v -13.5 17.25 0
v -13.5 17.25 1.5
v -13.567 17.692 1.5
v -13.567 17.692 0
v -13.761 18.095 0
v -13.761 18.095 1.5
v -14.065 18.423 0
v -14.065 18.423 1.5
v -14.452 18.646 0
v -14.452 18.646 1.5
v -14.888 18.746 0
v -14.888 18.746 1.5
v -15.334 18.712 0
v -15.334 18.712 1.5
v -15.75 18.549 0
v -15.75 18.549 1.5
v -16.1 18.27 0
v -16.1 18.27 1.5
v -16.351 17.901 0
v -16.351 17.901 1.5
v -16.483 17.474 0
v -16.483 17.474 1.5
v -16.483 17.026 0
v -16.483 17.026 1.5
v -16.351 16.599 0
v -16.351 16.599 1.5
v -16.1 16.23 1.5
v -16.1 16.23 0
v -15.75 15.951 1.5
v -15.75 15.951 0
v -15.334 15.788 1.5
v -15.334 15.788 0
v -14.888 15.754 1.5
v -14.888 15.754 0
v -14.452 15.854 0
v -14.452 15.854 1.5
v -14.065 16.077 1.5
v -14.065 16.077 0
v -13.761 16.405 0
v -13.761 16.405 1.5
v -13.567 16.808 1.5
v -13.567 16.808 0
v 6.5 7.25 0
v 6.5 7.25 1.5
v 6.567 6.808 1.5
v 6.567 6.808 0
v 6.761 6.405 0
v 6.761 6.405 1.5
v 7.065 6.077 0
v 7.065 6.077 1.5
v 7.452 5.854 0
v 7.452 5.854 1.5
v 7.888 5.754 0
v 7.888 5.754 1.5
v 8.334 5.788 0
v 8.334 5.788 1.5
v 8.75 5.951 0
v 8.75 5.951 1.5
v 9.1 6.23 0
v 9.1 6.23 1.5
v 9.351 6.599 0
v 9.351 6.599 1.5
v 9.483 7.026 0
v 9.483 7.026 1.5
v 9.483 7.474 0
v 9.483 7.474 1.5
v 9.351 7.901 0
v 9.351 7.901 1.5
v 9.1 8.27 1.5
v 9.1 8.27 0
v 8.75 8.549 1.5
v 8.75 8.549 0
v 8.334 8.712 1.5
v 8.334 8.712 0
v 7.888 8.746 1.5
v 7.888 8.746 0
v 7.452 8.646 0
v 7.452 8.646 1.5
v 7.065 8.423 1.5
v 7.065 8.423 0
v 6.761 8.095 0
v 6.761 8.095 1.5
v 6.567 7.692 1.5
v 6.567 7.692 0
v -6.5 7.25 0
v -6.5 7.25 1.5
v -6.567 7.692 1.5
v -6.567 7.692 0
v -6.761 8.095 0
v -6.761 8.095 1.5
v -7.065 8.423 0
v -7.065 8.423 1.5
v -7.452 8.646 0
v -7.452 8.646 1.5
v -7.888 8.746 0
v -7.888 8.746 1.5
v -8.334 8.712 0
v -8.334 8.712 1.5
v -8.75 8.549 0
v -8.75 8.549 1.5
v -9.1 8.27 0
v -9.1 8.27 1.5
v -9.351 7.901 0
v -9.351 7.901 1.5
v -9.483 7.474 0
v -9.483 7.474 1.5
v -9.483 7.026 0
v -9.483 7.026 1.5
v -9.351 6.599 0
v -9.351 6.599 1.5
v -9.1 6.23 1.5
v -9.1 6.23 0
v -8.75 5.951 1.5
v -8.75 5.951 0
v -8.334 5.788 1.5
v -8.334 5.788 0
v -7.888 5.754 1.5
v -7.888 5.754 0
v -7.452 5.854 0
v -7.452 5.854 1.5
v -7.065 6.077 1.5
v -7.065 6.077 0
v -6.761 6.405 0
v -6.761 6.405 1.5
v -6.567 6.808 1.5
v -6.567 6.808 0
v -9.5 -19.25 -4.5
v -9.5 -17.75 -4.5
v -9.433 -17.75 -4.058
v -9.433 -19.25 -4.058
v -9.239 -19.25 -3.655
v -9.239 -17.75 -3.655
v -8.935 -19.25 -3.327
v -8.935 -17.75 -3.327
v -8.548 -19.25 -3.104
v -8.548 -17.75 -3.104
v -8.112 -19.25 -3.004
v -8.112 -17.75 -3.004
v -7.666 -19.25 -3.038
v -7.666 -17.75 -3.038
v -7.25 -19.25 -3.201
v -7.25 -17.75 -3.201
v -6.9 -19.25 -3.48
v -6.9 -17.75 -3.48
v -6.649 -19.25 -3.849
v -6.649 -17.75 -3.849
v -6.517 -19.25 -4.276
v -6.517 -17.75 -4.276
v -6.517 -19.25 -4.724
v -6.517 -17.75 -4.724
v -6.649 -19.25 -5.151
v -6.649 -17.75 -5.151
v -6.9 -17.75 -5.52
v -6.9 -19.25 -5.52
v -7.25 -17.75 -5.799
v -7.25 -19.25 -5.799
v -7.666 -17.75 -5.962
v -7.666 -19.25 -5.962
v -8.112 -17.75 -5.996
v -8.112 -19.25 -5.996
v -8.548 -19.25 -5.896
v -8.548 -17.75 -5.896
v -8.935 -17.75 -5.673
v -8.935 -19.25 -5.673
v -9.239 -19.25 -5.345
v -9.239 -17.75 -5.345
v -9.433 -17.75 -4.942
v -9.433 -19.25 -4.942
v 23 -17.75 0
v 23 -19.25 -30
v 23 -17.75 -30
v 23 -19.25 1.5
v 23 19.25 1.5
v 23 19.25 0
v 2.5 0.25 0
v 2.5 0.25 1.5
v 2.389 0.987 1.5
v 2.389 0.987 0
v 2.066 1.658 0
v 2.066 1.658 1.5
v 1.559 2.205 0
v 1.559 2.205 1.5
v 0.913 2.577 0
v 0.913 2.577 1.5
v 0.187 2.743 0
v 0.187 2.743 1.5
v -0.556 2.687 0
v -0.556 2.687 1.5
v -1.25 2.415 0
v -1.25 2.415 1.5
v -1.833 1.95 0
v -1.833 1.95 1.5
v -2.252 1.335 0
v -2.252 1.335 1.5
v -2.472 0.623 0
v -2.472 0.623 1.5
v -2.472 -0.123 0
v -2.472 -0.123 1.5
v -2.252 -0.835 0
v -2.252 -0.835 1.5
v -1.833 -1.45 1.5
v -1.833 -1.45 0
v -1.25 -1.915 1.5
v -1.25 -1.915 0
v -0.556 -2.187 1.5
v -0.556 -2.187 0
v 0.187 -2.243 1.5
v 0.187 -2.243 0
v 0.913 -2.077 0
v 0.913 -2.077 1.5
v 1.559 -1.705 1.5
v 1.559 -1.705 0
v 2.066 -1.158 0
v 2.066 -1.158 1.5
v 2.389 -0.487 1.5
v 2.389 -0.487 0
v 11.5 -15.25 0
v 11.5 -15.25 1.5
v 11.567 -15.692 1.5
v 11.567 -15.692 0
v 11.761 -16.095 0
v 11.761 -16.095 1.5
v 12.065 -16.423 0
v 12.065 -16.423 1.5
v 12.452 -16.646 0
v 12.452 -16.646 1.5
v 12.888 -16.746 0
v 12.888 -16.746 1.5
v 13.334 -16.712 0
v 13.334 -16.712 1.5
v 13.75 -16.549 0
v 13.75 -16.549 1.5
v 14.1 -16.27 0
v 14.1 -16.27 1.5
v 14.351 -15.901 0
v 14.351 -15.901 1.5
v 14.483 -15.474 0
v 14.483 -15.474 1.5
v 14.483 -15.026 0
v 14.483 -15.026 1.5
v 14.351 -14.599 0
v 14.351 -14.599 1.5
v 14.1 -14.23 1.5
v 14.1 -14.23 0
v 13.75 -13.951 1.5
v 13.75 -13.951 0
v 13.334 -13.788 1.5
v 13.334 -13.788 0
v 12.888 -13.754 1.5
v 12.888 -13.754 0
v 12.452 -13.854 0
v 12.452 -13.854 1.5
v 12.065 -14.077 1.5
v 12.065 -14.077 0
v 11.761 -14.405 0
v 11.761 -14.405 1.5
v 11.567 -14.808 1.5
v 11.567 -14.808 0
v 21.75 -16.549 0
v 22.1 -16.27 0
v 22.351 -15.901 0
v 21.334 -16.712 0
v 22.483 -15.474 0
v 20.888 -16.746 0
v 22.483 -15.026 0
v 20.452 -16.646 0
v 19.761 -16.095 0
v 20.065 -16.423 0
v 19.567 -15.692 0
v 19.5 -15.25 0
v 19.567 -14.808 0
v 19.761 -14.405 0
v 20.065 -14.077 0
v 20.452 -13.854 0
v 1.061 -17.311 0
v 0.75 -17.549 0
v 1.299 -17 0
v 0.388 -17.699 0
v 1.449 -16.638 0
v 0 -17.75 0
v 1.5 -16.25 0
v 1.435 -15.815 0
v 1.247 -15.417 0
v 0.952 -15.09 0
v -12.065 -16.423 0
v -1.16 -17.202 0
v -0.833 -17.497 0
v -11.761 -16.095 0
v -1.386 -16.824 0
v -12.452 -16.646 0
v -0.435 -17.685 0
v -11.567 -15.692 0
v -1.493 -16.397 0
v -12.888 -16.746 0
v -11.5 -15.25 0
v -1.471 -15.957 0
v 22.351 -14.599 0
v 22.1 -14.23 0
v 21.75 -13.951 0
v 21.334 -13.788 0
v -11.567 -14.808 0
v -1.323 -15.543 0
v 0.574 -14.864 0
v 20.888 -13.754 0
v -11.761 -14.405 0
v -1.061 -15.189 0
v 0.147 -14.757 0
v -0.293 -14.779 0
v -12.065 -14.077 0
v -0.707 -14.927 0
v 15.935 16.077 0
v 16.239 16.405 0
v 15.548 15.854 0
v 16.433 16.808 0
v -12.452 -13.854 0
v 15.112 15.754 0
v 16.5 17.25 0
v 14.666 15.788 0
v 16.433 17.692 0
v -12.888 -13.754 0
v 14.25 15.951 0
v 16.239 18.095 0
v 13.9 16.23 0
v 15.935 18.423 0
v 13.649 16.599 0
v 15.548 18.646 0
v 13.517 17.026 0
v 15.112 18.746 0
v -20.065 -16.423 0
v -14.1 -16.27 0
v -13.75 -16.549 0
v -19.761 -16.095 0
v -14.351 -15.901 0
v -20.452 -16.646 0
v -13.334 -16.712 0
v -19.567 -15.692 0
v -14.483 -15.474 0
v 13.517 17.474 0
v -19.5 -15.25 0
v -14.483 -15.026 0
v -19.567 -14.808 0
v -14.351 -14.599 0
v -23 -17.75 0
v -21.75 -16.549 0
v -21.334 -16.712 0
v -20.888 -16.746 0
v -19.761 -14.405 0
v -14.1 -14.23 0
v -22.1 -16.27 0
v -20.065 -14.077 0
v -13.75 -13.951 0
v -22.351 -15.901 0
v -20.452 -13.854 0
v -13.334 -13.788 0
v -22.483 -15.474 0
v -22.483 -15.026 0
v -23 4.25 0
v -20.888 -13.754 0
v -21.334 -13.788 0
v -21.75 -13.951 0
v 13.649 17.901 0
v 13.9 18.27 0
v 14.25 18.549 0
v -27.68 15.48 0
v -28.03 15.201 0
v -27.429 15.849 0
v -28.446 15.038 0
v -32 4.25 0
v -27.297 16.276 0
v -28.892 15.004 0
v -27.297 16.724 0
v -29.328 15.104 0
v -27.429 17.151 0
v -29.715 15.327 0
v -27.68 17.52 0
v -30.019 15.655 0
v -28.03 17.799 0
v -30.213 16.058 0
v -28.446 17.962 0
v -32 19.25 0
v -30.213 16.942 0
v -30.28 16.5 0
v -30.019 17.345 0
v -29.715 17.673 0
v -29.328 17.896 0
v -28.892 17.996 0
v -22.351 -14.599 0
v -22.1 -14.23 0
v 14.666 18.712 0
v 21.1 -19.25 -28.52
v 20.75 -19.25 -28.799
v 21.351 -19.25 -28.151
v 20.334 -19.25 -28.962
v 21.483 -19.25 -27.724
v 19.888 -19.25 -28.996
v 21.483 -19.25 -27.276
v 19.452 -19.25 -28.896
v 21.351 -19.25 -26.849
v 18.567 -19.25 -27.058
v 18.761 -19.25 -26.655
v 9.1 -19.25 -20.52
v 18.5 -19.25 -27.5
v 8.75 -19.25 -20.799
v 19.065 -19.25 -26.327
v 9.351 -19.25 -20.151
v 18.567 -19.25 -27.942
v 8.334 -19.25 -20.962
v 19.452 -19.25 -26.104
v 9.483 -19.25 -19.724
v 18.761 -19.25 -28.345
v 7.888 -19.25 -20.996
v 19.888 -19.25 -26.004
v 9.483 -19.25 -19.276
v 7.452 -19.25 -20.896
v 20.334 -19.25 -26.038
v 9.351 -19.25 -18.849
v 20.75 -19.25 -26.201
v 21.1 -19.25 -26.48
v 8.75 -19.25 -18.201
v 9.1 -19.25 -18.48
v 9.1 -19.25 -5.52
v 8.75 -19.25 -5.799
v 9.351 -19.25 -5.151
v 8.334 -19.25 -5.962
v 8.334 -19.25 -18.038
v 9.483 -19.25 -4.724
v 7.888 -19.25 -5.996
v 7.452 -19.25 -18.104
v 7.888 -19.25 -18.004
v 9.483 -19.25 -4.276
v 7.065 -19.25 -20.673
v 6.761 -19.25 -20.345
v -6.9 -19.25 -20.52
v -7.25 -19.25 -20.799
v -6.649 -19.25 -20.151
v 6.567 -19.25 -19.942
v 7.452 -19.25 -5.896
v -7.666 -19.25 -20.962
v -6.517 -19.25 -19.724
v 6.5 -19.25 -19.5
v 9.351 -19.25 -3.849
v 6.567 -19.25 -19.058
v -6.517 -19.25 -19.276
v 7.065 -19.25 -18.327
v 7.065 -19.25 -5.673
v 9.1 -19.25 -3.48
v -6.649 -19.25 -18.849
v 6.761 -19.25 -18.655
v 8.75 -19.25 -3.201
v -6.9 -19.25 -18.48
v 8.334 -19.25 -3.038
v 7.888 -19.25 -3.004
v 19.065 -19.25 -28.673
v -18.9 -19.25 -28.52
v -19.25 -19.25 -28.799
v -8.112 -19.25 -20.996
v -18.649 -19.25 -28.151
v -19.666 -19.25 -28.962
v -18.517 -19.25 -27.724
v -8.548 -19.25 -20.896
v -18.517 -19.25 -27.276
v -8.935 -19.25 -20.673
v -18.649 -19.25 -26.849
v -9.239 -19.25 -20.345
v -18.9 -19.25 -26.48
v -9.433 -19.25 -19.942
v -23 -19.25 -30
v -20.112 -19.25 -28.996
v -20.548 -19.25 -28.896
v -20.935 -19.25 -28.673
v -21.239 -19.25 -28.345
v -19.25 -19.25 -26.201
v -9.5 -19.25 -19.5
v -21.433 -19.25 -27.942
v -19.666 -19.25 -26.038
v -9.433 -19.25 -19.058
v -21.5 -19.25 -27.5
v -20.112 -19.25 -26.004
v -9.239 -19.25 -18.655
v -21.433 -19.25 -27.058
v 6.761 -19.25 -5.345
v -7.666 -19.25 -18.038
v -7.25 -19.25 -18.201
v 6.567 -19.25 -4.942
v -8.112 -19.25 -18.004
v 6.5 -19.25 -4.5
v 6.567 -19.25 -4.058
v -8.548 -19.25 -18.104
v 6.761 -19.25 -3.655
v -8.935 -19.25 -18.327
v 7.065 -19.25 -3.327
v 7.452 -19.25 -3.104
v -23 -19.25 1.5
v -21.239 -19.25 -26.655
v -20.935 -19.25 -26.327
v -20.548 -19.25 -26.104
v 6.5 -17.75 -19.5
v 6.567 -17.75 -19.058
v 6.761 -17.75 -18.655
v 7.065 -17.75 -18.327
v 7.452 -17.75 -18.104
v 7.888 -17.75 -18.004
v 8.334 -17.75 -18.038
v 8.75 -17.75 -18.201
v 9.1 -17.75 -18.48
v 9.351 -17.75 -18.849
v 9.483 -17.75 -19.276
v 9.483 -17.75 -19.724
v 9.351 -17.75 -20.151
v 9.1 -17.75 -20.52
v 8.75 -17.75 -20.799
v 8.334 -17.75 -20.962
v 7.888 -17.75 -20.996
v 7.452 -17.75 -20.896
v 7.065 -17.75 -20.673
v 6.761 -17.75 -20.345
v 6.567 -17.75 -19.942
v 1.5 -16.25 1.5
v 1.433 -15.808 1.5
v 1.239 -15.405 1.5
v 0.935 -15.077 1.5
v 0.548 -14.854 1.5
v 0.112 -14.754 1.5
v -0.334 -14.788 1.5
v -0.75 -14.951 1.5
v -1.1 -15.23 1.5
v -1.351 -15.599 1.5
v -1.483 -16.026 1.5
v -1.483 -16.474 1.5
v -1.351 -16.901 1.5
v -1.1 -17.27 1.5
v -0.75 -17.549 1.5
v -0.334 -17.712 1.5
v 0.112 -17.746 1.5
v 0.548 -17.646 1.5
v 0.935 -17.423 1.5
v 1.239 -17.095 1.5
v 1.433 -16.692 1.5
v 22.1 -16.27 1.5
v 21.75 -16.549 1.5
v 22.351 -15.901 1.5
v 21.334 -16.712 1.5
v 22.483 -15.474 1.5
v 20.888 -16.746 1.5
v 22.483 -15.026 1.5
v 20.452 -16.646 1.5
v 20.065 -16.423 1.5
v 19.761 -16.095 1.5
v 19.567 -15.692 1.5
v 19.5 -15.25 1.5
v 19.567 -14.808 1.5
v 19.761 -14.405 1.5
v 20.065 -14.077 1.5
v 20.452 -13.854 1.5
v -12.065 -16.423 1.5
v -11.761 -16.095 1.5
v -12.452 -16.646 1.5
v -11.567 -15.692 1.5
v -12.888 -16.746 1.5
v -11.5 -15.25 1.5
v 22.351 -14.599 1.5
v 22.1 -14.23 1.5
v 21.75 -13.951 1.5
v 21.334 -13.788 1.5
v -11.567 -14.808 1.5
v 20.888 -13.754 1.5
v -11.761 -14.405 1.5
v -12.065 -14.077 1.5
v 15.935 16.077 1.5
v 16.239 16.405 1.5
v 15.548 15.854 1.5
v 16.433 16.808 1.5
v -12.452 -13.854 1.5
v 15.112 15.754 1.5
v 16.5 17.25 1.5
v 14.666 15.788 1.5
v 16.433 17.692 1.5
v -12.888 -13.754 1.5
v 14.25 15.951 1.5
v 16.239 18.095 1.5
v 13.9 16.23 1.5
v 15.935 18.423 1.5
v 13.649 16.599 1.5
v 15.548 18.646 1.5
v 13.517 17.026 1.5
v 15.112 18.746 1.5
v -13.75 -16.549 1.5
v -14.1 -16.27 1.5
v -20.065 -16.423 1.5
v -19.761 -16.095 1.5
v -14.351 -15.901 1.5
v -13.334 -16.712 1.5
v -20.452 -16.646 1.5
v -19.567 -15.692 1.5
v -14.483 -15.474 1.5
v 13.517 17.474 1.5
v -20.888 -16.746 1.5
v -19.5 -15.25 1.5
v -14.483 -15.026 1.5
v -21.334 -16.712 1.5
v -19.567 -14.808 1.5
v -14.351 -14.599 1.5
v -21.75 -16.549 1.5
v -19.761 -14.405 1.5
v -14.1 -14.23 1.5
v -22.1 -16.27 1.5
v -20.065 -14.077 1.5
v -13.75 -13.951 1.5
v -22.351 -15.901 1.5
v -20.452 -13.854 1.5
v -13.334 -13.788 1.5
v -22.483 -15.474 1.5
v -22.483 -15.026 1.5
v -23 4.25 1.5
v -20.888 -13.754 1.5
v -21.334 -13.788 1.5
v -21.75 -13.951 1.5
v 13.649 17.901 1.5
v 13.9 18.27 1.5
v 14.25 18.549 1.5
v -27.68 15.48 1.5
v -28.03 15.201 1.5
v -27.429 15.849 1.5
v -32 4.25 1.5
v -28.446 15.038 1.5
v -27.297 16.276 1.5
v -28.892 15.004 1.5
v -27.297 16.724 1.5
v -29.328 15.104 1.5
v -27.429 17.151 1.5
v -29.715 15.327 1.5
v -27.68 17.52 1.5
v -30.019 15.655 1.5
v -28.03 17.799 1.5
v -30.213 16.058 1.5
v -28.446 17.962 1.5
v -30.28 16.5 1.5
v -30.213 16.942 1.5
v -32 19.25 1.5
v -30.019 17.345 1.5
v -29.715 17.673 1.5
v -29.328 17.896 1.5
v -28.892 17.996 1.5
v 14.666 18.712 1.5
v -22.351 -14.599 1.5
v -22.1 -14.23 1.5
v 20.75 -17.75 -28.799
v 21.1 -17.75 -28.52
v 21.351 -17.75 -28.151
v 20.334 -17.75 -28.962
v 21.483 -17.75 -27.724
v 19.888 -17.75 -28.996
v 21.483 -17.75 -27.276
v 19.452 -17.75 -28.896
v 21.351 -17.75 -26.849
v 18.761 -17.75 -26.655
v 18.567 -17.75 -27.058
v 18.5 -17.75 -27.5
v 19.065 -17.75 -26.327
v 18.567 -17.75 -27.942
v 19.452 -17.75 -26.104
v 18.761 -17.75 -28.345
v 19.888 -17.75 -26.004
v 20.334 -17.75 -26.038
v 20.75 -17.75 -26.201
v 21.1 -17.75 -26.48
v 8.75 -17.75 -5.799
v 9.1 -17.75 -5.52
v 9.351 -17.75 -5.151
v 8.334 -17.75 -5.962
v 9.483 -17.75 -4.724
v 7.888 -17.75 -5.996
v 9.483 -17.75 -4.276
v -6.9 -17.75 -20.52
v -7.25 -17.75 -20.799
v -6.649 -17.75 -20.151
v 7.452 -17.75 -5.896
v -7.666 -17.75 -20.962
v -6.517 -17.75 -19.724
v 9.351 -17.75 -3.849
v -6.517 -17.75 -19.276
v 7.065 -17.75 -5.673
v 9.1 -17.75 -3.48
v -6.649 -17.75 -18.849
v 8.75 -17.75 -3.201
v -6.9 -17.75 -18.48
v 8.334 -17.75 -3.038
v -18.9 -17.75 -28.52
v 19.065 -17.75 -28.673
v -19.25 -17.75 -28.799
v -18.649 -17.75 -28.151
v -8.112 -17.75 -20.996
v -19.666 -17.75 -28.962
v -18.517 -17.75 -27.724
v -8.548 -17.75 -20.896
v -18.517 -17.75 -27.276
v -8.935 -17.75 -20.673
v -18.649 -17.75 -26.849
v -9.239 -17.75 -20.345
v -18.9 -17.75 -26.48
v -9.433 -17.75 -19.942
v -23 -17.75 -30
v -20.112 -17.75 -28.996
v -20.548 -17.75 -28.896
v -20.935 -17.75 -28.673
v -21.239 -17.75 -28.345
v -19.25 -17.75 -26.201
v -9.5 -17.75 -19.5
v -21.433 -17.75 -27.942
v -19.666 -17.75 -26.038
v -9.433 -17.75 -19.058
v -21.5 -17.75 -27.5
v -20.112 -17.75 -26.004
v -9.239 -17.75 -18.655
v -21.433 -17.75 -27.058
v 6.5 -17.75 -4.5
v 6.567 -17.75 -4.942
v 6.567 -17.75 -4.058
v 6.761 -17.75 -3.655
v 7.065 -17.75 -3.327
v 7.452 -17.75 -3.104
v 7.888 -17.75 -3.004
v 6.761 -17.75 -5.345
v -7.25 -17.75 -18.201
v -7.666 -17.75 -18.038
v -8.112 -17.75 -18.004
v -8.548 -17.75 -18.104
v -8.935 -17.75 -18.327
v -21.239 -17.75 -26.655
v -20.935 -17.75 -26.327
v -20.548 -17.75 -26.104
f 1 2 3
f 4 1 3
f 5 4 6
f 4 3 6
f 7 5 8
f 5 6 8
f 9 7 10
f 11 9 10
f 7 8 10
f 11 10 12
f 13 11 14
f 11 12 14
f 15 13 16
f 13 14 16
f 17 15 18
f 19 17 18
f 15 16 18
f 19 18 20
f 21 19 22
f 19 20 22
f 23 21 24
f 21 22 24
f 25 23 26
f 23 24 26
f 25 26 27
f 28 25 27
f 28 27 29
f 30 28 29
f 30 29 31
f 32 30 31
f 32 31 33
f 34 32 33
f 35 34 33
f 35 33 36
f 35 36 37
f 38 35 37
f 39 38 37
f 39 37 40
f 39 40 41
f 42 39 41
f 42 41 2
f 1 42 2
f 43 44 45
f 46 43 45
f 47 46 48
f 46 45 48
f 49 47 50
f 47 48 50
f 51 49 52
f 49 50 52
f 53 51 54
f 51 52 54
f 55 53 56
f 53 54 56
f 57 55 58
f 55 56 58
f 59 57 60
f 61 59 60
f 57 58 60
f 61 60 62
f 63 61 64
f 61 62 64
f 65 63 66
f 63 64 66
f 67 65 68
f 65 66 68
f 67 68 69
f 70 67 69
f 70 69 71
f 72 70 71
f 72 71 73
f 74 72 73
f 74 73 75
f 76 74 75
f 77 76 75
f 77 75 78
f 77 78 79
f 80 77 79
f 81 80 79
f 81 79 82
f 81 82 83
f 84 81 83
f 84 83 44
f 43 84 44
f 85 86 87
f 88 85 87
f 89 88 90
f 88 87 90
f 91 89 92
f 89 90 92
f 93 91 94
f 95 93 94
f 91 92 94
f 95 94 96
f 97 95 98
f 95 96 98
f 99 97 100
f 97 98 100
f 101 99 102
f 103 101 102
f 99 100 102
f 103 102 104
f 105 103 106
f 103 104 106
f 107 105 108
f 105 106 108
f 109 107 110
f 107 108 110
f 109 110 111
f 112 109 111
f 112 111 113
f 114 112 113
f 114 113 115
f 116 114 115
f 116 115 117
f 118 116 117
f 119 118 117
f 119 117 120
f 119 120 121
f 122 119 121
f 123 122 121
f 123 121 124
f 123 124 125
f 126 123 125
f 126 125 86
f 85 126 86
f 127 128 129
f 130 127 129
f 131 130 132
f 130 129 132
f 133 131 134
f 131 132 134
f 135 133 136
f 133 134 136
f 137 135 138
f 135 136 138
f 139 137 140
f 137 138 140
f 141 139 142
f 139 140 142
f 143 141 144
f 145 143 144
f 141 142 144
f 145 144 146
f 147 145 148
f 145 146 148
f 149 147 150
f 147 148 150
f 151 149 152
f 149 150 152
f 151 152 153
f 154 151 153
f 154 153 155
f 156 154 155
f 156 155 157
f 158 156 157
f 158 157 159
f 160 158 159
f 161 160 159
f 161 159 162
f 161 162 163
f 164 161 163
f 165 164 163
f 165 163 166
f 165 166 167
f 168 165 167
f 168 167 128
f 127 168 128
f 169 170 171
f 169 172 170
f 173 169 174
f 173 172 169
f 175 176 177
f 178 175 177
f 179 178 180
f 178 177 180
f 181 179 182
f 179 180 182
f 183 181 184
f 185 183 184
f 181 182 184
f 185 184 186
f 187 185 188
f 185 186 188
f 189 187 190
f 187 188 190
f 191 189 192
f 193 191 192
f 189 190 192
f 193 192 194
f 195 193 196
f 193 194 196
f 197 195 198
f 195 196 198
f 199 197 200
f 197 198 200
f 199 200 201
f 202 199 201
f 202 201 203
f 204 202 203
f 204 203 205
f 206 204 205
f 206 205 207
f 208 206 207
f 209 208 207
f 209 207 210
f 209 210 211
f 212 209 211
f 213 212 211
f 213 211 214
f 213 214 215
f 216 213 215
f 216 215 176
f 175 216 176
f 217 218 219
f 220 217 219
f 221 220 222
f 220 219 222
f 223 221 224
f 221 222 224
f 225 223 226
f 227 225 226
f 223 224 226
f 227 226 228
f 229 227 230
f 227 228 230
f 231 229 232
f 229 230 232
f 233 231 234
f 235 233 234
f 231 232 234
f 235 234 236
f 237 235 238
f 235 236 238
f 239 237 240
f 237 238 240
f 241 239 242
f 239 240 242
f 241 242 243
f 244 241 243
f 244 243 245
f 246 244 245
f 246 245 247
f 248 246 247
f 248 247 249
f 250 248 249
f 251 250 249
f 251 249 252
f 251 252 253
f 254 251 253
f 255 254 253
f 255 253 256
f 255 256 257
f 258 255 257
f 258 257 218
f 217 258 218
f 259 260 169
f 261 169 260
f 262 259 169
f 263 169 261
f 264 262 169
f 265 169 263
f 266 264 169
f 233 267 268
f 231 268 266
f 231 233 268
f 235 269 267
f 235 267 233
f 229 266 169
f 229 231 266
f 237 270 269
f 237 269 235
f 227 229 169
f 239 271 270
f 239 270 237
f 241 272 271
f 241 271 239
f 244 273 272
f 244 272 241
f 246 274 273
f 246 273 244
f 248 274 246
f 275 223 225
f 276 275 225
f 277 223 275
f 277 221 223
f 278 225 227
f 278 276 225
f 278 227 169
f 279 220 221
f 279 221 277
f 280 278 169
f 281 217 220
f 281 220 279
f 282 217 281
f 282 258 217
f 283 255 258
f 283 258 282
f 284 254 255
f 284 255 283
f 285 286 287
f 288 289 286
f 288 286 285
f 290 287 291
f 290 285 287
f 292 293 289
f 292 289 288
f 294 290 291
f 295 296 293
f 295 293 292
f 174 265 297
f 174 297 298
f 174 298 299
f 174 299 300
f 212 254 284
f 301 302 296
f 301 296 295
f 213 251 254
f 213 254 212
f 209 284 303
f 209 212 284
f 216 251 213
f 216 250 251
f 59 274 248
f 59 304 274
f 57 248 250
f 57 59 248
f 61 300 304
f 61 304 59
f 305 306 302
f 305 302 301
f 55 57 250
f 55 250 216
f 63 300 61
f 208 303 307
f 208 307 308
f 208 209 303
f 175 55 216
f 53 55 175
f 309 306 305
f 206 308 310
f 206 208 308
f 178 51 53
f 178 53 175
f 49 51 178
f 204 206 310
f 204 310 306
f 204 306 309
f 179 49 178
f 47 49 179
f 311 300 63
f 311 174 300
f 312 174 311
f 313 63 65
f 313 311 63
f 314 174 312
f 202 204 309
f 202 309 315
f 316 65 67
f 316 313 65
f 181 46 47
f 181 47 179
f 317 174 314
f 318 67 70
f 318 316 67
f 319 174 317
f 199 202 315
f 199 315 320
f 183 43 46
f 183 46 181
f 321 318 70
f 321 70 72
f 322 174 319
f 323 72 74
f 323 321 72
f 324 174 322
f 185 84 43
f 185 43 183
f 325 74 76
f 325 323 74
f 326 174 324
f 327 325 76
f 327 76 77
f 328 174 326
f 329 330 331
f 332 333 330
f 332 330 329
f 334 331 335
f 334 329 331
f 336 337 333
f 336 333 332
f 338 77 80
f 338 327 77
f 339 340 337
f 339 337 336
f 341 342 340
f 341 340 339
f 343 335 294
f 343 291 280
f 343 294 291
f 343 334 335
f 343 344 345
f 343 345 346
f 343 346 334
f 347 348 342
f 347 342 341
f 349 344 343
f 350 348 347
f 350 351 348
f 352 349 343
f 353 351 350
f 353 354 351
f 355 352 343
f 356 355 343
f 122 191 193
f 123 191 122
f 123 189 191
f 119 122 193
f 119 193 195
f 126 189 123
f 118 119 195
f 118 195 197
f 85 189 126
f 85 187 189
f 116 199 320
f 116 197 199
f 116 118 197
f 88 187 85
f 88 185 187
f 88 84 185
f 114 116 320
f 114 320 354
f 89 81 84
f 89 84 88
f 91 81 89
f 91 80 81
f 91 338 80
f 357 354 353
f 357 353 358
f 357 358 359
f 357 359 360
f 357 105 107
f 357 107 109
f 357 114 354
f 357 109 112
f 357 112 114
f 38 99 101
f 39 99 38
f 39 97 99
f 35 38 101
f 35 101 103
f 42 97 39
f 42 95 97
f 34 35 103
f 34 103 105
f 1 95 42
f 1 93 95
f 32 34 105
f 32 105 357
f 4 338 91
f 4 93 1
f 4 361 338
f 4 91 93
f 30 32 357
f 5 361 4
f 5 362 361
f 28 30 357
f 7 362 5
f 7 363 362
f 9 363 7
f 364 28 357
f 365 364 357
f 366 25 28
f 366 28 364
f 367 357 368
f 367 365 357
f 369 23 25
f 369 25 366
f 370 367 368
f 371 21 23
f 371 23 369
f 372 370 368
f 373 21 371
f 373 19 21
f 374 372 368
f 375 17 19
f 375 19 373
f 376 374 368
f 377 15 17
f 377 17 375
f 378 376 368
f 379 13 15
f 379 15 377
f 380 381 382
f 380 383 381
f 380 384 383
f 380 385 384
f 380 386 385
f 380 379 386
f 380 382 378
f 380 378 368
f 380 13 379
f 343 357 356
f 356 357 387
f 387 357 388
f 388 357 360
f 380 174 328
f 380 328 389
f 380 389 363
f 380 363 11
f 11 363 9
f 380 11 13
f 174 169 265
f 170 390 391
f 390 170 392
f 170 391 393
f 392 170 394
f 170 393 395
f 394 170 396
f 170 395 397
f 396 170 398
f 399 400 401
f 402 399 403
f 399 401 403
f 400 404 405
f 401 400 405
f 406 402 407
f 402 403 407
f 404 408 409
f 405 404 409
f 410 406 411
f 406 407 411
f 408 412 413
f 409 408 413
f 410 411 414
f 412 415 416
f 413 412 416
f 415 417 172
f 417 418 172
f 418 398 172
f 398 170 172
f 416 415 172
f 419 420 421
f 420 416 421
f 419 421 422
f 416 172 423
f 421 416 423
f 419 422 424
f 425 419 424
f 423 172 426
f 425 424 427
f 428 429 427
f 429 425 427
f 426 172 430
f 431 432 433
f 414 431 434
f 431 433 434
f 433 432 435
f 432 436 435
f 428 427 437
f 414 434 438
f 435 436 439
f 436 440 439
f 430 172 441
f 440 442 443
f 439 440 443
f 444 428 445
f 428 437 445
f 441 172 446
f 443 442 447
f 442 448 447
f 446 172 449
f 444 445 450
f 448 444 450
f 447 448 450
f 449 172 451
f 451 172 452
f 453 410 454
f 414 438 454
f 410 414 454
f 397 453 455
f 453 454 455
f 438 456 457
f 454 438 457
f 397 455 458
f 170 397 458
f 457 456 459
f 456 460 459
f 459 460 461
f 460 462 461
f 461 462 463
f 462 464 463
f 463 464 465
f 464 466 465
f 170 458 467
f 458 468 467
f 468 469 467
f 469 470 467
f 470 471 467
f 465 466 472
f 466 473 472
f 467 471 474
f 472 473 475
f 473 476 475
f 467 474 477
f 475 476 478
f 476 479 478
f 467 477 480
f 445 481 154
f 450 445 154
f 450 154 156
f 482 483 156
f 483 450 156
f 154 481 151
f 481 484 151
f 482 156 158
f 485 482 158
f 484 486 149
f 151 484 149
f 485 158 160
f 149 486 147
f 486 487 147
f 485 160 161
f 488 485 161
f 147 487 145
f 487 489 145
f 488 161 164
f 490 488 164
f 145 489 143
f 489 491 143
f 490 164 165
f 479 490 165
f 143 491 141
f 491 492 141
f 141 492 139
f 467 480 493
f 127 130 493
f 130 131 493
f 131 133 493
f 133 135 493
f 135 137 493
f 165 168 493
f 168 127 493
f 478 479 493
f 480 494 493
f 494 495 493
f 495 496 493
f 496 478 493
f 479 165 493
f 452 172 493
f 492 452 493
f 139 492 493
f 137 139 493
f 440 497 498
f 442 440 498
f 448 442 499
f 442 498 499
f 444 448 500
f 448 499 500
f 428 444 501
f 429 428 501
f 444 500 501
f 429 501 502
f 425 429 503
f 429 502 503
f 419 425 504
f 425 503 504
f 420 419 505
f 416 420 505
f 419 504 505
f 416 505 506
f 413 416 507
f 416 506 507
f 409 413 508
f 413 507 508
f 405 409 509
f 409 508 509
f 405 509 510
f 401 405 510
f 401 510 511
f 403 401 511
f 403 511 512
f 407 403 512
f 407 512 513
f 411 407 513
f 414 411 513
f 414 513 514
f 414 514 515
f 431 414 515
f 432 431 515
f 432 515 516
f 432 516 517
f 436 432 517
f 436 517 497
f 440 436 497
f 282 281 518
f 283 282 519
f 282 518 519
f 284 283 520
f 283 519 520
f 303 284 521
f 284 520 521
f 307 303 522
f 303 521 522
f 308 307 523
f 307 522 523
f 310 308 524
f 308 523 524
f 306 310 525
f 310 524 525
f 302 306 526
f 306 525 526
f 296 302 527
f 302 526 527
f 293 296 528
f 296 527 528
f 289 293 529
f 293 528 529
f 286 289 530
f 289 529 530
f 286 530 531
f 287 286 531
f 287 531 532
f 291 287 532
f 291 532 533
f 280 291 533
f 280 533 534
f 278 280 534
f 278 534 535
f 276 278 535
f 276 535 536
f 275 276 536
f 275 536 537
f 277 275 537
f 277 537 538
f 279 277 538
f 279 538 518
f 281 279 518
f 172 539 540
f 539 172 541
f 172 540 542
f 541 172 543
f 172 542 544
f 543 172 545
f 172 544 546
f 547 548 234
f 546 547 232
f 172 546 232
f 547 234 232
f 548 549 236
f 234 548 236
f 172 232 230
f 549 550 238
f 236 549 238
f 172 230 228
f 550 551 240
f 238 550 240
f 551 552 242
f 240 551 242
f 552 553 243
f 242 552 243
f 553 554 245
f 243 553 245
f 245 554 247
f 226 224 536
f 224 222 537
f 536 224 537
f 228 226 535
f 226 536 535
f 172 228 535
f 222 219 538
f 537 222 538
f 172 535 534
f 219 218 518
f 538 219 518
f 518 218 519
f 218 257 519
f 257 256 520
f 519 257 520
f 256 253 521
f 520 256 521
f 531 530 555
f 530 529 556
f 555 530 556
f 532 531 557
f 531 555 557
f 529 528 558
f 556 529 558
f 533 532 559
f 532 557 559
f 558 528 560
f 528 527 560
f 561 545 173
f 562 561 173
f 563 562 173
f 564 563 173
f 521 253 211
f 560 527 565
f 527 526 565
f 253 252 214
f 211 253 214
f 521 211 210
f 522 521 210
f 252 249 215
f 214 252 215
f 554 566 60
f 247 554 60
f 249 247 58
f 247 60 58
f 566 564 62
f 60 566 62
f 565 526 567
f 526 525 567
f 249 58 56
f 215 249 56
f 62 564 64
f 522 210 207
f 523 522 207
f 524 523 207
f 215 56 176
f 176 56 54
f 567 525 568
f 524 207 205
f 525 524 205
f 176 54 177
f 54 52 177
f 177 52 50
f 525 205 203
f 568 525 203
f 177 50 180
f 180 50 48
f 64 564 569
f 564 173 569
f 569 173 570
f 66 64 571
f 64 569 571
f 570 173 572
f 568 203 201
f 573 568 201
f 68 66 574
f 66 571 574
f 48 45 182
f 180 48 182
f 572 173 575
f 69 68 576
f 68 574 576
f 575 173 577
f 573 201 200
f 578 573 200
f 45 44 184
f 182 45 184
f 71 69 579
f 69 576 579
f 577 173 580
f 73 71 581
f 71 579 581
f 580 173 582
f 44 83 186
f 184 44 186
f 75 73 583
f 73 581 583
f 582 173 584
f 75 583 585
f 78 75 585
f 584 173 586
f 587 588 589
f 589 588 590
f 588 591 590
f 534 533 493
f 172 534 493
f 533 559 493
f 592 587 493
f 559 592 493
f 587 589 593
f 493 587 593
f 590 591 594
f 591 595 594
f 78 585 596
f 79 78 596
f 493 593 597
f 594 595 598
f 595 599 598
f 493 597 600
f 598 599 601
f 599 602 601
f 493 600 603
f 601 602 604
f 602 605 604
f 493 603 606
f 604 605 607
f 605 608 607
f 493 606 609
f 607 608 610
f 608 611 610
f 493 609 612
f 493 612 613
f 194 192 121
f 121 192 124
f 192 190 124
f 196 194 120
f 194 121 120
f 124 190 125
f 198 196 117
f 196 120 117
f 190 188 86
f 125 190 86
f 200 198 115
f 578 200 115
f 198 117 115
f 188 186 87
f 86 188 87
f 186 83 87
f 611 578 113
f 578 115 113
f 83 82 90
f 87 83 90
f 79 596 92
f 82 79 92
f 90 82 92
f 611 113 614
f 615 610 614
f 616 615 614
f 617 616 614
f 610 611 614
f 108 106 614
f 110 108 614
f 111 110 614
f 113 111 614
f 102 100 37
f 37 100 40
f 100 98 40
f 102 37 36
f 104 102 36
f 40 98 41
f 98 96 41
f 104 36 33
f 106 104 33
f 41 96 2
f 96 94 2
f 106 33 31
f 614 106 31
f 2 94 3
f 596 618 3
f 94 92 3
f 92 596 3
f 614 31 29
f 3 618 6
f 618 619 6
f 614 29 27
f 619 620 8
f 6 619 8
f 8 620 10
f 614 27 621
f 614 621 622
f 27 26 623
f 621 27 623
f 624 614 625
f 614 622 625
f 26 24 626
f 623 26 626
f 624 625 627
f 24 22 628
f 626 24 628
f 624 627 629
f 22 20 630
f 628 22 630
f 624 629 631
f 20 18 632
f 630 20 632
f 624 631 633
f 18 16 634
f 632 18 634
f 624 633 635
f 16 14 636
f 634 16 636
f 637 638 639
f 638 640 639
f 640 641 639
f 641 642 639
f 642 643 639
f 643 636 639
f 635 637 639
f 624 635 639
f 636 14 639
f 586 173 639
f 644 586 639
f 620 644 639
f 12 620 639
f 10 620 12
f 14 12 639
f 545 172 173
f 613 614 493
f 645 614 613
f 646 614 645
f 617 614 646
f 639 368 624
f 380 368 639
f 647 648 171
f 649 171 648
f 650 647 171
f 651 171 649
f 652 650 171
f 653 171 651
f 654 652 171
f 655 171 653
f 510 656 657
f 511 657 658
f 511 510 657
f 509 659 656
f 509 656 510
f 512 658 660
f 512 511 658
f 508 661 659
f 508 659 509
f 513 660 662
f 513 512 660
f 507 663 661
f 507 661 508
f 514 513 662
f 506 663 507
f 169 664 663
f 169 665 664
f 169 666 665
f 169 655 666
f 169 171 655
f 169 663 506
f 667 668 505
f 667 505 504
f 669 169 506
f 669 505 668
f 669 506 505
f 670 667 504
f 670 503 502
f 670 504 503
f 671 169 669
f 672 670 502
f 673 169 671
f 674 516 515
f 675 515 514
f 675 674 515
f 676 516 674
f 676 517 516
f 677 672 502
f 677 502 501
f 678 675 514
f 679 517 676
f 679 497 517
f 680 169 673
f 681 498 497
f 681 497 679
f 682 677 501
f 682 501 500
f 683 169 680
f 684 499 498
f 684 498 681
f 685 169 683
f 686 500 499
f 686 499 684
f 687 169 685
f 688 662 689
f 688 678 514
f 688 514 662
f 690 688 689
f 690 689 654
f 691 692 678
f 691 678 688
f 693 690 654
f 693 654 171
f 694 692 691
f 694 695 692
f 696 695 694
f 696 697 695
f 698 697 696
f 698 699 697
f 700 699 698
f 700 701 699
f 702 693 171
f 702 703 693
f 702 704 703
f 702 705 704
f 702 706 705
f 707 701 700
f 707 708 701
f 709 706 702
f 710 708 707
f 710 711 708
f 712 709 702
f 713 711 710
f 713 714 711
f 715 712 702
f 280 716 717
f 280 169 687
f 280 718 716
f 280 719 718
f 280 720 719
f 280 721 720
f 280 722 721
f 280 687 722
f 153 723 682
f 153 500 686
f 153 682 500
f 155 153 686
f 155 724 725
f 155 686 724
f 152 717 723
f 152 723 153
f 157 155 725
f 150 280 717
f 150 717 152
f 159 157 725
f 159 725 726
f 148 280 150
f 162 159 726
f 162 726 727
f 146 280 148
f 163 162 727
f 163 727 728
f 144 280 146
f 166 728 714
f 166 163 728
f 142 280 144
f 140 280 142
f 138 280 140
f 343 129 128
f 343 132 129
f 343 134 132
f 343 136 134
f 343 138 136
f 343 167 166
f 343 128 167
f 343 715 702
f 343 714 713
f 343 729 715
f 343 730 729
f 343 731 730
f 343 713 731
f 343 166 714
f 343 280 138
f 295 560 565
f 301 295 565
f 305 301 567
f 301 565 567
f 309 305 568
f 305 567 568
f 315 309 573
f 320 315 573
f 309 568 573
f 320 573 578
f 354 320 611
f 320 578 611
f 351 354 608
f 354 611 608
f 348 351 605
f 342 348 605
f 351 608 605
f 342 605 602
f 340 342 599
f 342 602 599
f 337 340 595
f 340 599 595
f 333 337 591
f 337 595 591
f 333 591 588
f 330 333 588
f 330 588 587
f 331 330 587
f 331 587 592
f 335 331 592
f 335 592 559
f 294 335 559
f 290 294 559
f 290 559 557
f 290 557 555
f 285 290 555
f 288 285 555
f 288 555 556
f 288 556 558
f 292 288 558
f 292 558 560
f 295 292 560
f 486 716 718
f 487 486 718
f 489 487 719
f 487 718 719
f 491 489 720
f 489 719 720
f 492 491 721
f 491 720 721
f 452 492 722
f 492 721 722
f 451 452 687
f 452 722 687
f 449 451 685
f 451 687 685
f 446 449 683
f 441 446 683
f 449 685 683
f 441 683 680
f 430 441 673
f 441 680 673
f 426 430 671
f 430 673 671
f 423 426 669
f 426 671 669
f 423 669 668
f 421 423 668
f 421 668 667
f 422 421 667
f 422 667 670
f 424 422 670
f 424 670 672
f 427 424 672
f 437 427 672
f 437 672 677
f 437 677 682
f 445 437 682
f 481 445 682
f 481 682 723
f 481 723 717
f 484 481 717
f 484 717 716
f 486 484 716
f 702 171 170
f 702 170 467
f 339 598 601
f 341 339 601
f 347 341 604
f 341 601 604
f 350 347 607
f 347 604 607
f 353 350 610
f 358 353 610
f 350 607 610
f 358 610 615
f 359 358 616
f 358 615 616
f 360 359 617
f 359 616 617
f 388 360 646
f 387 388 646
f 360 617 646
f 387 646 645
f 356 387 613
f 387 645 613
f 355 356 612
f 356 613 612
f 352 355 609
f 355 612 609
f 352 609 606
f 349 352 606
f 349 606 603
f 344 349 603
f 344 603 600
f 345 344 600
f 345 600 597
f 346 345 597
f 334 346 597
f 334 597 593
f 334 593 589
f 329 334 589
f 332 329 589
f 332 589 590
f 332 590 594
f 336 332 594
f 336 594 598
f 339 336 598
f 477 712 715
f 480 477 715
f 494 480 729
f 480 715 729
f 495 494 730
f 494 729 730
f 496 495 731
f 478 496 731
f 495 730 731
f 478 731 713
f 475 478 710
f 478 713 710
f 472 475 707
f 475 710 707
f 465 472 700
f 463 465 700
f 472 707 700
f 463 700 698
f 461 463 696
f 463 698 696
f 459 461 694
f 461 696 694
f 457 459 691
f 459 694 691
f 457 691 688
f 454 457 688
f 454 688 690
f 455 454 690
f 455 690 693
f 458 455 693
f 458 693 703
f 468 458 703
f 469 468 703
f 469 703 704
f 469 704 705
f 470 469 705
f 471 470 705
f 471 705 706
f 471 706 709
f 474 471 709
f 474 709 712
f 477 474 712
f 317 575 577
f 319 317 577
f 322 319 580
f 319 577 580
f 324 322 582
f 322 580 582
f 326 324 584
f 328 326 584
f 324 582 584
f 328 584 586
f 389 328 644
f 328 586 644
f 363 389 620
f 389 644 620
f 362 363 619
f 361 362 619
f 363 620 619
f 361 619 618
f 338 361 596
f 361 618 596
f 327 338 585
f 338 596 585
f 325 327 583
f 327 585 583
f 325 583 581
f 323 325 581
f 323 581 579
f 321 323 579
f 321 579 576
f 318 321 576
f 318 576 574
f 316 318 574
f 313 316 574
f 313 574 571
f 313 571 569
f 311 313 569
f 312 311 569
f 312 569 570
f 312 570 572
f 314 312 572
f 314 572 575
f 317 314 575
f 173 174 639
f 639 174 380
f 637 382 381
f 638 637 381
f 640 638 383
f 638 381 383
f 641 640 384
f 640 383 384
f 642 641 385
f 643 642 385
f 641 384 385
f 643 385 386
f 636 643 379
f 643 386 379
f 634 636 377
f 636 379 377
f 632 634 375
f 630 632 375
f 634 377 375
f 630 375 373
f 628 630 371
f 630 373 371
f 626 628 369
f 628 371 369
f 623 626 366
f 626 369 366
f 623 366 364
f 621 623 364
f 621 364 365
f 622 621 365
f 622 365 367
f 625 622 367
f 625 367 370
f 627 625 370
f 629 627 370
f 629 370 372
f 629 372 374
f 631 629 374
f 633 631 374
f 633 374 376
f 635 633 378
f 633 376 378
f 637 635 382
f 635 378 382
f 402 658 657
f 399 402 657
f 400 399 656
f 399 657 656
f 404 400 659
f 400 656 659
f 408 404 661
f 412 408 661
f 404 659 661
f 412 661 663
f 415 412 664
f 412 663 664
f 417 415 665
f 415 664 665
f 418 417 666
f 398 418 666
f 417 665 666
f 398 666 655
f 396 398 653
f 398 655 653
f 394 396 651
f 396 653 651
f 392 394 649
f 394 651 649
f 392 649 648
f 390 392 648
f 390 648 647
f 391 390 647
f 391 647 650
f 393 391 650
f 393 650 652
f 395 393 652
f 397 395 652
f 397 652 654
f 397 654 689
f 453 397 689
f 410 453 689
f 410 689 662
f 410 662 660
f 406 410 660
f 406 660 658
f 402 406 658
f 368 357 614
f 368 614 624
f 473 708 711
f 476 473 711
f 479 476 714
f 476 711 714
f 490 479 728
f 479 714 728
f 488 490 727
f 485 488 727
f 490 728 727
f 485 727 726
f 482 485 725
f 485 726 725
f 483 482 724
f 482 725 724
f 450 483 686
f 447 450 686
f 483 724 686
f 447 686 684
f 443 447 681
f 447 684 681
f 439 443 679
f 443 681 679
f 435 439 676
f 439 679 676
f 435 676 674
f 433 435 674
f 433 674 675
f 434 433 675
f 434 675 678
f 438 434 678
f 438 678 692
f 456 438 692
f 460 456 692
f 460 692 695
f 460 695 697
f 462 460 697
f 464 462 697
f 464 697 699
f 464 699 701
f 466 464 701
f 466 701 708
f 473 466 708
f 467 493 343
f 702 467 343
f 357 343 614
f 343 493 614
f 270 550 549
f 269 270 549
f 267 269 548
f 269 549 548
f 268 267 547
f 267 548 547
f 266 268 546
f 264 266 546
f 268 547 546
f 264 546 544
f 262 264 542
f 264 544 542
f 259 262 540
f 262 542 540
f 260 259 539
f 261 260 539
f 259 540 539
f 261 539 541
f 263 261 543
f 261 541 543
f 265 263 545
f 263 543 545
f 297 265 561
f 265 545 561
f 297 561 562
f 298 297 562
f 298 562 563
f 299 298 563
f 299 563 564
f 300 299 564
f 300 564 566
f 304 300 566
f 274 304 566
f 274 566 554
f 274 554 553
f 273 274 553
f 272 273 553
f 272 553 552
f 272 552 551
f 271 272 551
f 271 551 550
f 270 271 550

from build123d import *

# Parameters (mm, degrees)
SKETCH_1_W          = 46
SKETCH_1_H          = 38.5
EXTRUDE_1_DEPTH     = 1.5
SKETCH_2_W          = 46
SKETCH_2_H          = 1.5
EXTRUDE_2_DEPTH     = 30
CUT_EXTRUDE_1_REACH = 54.896
SKETCH_3_R          = 1.5
CUT_EXTRUDE_2_REACH = 45.495
SKETCH_4_R          = 1.5
SKETCH_4_R_2        = 2.5
SKETCH_5_W          = 9
SKETCH_5_H          = 15
SKETCH_5_R          = 1.5
EXTRUDE_3_DEPTH     = 1.5


with BuildPart() as part:
    # Эскиз1 → Бобышка-Вытянуть1 (new body)
    with BuildSketch(Plane.XY):
        Rectangle(SKETCH_1_W, SKETCH_1_H)
    extrude(amount=EXTRUDE_1_DEPTH)

    # Эскиз2 → Бобышка-Вытянуть2 (add)
    with BuildSketch(Plane(origin=(0, 0, 0), x_dir=(-1, 0, 0), z_dir=(0, 0, -1))):
        with Locations((0, -18.5)):
            Rectangle(SKETCH_2_W, SKETCH_2_H)
    extrude(amount=EXTRUDE_2_DEPTH)

    # Эскиз3 → Вырез-Вытянуть1 (cut, up to next)
    with BuildSketch(Plane(origin=(0, -17.75, 0), x_dir=(1, 0, 0), z_dir=(0, 1, 0)), mode=Mode.PRIVATE) as cut_extrude_1_sk1:
        with Locations(Location((-8, 19.5, 0), (0, 0, 180))):
            Circle(SKETCH_3_R)
    cut_extrude_1_tool1 = extrude(cut_extrude_1_sk1.sketch, amount=-CUT_EXTRUDE_1_REACH, mode=Mode.PRIVATE) & part.part
    # Эскиз3 → Вырез-Вытянуть1 (cut, up to next)
    with BuildSketch(Plane(origin=(0, -17.75, 0), x_dir=(1, 0, 0), z_dir=(0, 1, 0)), mode=Mode.PRIVATE) as cut_extrude_1_sk2:
        with Locations(Location((8, 19.5, 0), (0, 0, 180))):
            Circle(SKETCH_3_R)
    cut_extrude_1_tool2 = extrude(cut_extrude_1_sk2.sketch, amount=-CUT_EXTRUDE_1_REACH, mode=Mode.PRIVATE) & part.part
    # Эскиз3 → Вырез-Вытянуть1 (cut, up to next)
    with BuildSketch(Plane(origin=(0, -17.75, 0), x_dir=(1, 0, 0), z_dir=(0, 1, 0)), mode=Mode.PRIVATE) as cut_extrude_1_sk3:
        with Locations(Location((-8, 4.5, 0), (0, 0, 180))):
            Circle(SKETCH_3_R)
    cut_extrude_1_tool3 = extrude(cut_extrude_1_sk3.sketch, amount=-CUT_EXTRUDE_1_REACH, mode=Mode.PRIVATE) & part.part
    # Эскиз3 → Вырез-Вытянуть1 (cut, up to next)
    with BuildSketch(Plane(origin=(0, -17.75, 0), x_dir=(1, 0, 0), z_dir=(0, 1, 0)), mode=Mode.PRIVATE) as cut_extrude_1_sk4:
        with Locations(Location((8, 4.5, 0), (0, 0, 180))):
            Circle(SKETCH_3_R)
    cut_extrude_1_tool4 = extrude(cut_extrude_1_sk4.sketch, amount=-CUT_EXTRUDE_1_REACH, mode=Mode.PRIVATE) & part.part
    # Эскиз3 → Вырез-Вытянуть1 (cut, up to next)
    with BuildSketch(Plane(origin=(0, -17.75, 0), x_dir=(1, 0, 0), z_dir=(0, 1, 0)), mode=Mode.PRIVATE) as cut_extrude_1_sk5:
        with Locations(Location((-20, 27.5, 0), (0, 0, 180))):
            Circle(SKETCH_3_R)
    cut_extrude_1_tool5 = extrude(cut_extrude_1_sk5.sketch, amount=-CUT_EXTRUDE_1_REACH, mode=Mode.PRIVATE) & part.part
    # Эскиз3 → Вырез-Вытянуть1 (cut, up to next)
    with BuildSketch(Plane(origin=(0, -17.75, 0), x_dir=(1, 0, 0), z_dir=(0, 1, 0)), mode=Mode.PRIVATE) as cut_extrude_1_sk6:
        with Locations(Location((20, 27.5, 0), (0, 0, 180))):
            Circle(SKETCH_3_R)
    cut_extrude_1_tool6 = extrude(cut_extrude_1_sk6.sketch, amount=-CUT_EXTRUDE_1_REACH, mode=Mode.PRIVATE) & part.part
    add(cut_extrude_1_tool1.solids().sort_by_distance((-8, -17.75, -19.5))[0], mode=Mode.SUBTRACT)
    add(cut_extrude_1_tool2.solids().sort_by_distance((8, -17.75, -19.5))[0], mode=Mode.SUBTRACT)
    add(cut_extrude_1_tool3.solids().sort_by_distance((-8, -17.75, -4.5))[0], mode=Mode.SUBTRACT)
    add(cut_extrude_1_tool4.solids().sort_by_distance((8, -17.75, -4.5))[0], mode=Mode.SUBTRACT)
    add(cut_extrude_1_tool5.solids().sort_by_distance((-20, -17.75, -27.5))[0], mode=Mode.SUBTRACT)
    add(cut_extrude_1_tool6.solids().sort_by_distance((20, -17.75, -27.5))[0], mode=Mode.SUBTRACT)

    # Эскиз4 → Вырез-Вытянуть2 (cut, up to next)
    with BuildSketch(Plane.XY.offset(1.5), mode=Mode.PRIVATE) as cut_extrude_2_sk1:
        with Locations((-15, 17.25)):
            Circle(SKETCH_4_R)
    cut_extrude_2_tool1 = extrude(cut_extrude_2_sk1.sketch, amount=-CUT_EXTRUDE_2_REACH, mode=Mode.PRIVATE) & part.part
    # Эскиз4 → Вырез-Вытянуть2 (cut, up to next)
    with BuildSketch(Plane.XY.offset(1.5), mode=Mode.PRIVATE) as cut_extrude_2_sk2:
        with Locations((15, 17.25)):
            Circle(SKETCH_4_R)
    cut_extrude_2_tool2 = extrude(cut_extrude_2_sk2.sketch, amount=-CUT_EXTRUDE_2_REACH, mode=Mode.PRIVATE) & part.part
    # Эскиз4 → Вырез-Вытянуть2 (cut, up to next)
    with BuildSketch(Plane.XY.offset(1.5), mode=Mode.PRIVATE) as cut_extrude_2_sk3:
        with Locations((-8, 7.25)):
            Circle(SKETCH_4_R)
    cut_extrude_2_tool3 = extrude(cut_extrude_2_sk3.sketch, amount=-CUT_EXTRUDE_2_REACH, mode=Mode.PRIVATE) & part.part
    # Эскиз4 → Вырез-Вытянуть2 (cut, up to next)
    with BuildSketch(Plane.XY.offset(1.5), mode=Mode.PRIVATE) as cut_extrude_2_sk4:
        with Locations(Location((8, 7.25, 0), (0, 0, 180))):
            Circle(SKETCH_4_R)
    cut_extrude_2_tool4 = extrude(cut_extrude_2_sk4.sketch, amount=-CUT_EXTRUDE_2_REACH, mode=Mode.PRIVATE) & part.part
    # Эскиз4 → Вырез-Вытянуть2 (cut, up to next)
    with BuildSketch(Plane.XY.offset(1.5), mode=Mode.PRIVATE) as cut_extrude_2_sk5:
        with Locations((0, 0.25)):
            Circle(SKETCH_4_R_2)
    cut_extrude_2_tool5 = extrude(cut_extrude_2_sk5.sketch, amount=-CUT_EXTRUDE_2_REACH, mode=Mode.PRIVATE) & part.part
    # Эскиз4 → Вырез-Вытянуть2 (cut, up to next)
    with BuildSketch(Plane.XY.offset(1.5), mode=Mode.PRIVATE) as cut_extrude_2_sk6:
        with Locations((0, -16.25)):
            Circle(SKETCH_4_R)
    cut_extrude_2_tool6 = extrude(cut_extrude_2_sk6.sketch, amount=-CUT_EXTRUDE_2_REACH, mode=Mode.PRIVATE) & part.part
    # Эскиз4 → Вырез-Вытянуть2 (cut, up to next)
    with BuildSketch(Plane.XY.offset(1.5), mode=Mode.PRIVATE) as cut_extrude_2_sk7:
        with Locations((-21, -15.25)):
            Circle(SKETCH_4_R)
    cut_extrude_2_tool7 = extrude(cut_extrude_2_sk7.sketch, amount=-CUT_EXTRUDE_2_REACH, mode=Mode.PRIVATE) & part.part
    # Эскиз4 → Вырез-Вытянуть2 (cut, up to next)
    with BuildSketch(Plane.XY.offset(1.5), mode=Mode.PRIVATE) as cut_extrude_2_sk8:
        with Locations(Location((21, -15.25, 0), (0, 0, 180))):
            Circle(SKETCH_4_R)
    cut_extrude_2_tool8 = extrude(cut_extrude_2_sk8.sketch, amount=-CUT_EXTRUDE_2_REACH, mode=Mode.PRIVATE) & part.part
    # Эскиз4 → Вырез-Вытянуть2 (cut, up to next)
    with BuildSketch(Plane.XY.offset(1.5), mode=Mode.PRIVATE) as cut_extrude_2_sk9:
        with Locations((-13, -15.25)):
            Circle(SKETCH_4_R)
    cut_extrude_2_tool9 = extrude(cut_extrude_2_sk9.sketch, amount=-CUT_EXTRUDE_2_REACH, mode=Mode.PRIVATE) & part.part
    # Эскиз4 → Вырез-Вытянуть2 (cut, up to next)
    with BuildSketch(Plane.XY.offset(1.5), mode=Mode.PRIVATE) as cut_extrude_2_sk10:
        with Locations(Location((13, -15.25, 0), (0, 0, 180))):
            Circle(SKETCH_4_R)
    cut_extrude_2_tool10 = extrude(cut_extrude_2_sk10.sketch, amount=-CUT_EXTRUDE_2_REACH, mode=Mode.PRIVATE) & part.part
    add(cut_extrude_2_tool1.solids().sort_by_distance((-15, 17.25, 1.5))[0], mode=Mode.SUBTRACT)
    add(cut_extrude_2_tool2.solids().sort_by_distance((15, 17.25, 1.5))[0], mode=Mode.SUBTRACT)
    add(cut_extrude_2_tool3.solids().sort_by_distance((-8, 7.25, 1.5))[0], mode=Mode.SUBTRACT)
    add(cut_extrude_2_tool4.solids().sort_by_distance((8, 7.25, 1.5))[0], mode=Mode.SUBTRACT)
    add(cut_extrude_2_tool5.solids().sort_by_distance((0, 0.25, 1.5))[0], mode=Mode.SUBTRACT)
    add(cut_extrude_2_tool6.solids().sort_by_distance((0, -16.25, 1.5))[0], mode=Mode.SUBTRACT)
    add(cut_extrude_2_tool7.solids().sort_by_distance((-21, -15.25, 1.5))[0], mode=Mode.SUBTRACT)
    add(cut_extrude_2_tool8.solids().sort_by_distance((21, -15.25, 1.5))[0], mode=Mode.SUBTRACT)
    add(cut_extrude_2_tool9.solids().sort_by_distance((-13, -15.25, 1.5))[0], mode=Mode.SUBTRACT)
    add(cut_extrude_2_tool10.solids().sort_by_distance((13, -15.25, 1.5))[0], mode=Mode.SUBTRACT)

    # Эскиз5 → Бобышка-Вытянуть3 (add)
    with BuildSketch(Plane(origin=(0, 0, 0), x_dir=(-1, 0, 0), z_dir=(0, 0, -1))):
        with Locations((27.5, 11.75)):
            Rectangle(SKETCH_5_W, SKETCH_5_H)
        with Locations((28.78, 16.5)):
            Circle(SKETCH_5_R, mode=Mode.SUBTRACT)
    extrude(amount=-EXTRUDE_3_DEPTH)


solid = part.part
